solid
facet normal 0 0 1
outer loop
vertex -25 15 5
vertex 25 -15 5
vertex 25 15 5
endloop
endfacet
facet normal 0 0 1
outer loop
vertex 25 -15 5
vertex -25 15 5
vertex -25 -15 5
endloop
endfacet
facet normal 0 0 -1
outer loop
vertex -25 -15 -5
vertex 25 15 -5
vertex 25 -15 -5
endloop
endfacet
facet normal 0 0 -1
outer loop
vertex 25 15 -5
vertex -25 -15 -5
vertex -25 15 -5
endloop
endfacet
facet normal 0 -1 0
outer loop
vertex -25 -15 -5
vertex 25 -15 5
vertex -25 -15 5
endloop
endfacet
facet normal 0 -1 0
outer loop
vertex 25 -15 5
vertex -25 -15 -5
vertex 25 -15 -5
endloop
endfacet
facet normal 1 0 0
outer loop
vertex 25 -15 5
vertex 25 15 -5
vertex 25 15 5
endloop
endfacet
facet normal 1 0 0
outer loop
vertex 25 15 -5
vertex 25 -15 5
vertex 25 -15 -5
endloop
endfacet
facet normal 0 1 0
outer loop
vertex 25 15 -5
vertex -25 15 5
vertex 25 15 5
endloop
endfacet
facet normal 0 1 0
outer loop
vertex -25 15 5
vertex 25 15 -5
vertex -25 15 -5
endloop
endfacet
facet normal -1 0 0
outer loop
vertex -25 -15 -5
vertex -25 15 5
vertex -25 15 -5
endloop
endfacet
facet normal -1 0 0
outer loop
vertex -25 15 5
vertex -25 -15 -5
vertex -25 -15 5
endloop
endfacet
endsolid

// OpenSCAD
// Parameters
body_length = 50; //[25:100:1]
body_width  = 30; //[15:60:1]
body_height = 10; //[5:20:1]

$fn = 64;

// Main Body Module
module main_body() {
  cube([body_length, body_width, body_height], center=true);
}

// Final Model (single connected solid)
color([0.85, 0.85, 0.8])
union() {
  main_body();
}
